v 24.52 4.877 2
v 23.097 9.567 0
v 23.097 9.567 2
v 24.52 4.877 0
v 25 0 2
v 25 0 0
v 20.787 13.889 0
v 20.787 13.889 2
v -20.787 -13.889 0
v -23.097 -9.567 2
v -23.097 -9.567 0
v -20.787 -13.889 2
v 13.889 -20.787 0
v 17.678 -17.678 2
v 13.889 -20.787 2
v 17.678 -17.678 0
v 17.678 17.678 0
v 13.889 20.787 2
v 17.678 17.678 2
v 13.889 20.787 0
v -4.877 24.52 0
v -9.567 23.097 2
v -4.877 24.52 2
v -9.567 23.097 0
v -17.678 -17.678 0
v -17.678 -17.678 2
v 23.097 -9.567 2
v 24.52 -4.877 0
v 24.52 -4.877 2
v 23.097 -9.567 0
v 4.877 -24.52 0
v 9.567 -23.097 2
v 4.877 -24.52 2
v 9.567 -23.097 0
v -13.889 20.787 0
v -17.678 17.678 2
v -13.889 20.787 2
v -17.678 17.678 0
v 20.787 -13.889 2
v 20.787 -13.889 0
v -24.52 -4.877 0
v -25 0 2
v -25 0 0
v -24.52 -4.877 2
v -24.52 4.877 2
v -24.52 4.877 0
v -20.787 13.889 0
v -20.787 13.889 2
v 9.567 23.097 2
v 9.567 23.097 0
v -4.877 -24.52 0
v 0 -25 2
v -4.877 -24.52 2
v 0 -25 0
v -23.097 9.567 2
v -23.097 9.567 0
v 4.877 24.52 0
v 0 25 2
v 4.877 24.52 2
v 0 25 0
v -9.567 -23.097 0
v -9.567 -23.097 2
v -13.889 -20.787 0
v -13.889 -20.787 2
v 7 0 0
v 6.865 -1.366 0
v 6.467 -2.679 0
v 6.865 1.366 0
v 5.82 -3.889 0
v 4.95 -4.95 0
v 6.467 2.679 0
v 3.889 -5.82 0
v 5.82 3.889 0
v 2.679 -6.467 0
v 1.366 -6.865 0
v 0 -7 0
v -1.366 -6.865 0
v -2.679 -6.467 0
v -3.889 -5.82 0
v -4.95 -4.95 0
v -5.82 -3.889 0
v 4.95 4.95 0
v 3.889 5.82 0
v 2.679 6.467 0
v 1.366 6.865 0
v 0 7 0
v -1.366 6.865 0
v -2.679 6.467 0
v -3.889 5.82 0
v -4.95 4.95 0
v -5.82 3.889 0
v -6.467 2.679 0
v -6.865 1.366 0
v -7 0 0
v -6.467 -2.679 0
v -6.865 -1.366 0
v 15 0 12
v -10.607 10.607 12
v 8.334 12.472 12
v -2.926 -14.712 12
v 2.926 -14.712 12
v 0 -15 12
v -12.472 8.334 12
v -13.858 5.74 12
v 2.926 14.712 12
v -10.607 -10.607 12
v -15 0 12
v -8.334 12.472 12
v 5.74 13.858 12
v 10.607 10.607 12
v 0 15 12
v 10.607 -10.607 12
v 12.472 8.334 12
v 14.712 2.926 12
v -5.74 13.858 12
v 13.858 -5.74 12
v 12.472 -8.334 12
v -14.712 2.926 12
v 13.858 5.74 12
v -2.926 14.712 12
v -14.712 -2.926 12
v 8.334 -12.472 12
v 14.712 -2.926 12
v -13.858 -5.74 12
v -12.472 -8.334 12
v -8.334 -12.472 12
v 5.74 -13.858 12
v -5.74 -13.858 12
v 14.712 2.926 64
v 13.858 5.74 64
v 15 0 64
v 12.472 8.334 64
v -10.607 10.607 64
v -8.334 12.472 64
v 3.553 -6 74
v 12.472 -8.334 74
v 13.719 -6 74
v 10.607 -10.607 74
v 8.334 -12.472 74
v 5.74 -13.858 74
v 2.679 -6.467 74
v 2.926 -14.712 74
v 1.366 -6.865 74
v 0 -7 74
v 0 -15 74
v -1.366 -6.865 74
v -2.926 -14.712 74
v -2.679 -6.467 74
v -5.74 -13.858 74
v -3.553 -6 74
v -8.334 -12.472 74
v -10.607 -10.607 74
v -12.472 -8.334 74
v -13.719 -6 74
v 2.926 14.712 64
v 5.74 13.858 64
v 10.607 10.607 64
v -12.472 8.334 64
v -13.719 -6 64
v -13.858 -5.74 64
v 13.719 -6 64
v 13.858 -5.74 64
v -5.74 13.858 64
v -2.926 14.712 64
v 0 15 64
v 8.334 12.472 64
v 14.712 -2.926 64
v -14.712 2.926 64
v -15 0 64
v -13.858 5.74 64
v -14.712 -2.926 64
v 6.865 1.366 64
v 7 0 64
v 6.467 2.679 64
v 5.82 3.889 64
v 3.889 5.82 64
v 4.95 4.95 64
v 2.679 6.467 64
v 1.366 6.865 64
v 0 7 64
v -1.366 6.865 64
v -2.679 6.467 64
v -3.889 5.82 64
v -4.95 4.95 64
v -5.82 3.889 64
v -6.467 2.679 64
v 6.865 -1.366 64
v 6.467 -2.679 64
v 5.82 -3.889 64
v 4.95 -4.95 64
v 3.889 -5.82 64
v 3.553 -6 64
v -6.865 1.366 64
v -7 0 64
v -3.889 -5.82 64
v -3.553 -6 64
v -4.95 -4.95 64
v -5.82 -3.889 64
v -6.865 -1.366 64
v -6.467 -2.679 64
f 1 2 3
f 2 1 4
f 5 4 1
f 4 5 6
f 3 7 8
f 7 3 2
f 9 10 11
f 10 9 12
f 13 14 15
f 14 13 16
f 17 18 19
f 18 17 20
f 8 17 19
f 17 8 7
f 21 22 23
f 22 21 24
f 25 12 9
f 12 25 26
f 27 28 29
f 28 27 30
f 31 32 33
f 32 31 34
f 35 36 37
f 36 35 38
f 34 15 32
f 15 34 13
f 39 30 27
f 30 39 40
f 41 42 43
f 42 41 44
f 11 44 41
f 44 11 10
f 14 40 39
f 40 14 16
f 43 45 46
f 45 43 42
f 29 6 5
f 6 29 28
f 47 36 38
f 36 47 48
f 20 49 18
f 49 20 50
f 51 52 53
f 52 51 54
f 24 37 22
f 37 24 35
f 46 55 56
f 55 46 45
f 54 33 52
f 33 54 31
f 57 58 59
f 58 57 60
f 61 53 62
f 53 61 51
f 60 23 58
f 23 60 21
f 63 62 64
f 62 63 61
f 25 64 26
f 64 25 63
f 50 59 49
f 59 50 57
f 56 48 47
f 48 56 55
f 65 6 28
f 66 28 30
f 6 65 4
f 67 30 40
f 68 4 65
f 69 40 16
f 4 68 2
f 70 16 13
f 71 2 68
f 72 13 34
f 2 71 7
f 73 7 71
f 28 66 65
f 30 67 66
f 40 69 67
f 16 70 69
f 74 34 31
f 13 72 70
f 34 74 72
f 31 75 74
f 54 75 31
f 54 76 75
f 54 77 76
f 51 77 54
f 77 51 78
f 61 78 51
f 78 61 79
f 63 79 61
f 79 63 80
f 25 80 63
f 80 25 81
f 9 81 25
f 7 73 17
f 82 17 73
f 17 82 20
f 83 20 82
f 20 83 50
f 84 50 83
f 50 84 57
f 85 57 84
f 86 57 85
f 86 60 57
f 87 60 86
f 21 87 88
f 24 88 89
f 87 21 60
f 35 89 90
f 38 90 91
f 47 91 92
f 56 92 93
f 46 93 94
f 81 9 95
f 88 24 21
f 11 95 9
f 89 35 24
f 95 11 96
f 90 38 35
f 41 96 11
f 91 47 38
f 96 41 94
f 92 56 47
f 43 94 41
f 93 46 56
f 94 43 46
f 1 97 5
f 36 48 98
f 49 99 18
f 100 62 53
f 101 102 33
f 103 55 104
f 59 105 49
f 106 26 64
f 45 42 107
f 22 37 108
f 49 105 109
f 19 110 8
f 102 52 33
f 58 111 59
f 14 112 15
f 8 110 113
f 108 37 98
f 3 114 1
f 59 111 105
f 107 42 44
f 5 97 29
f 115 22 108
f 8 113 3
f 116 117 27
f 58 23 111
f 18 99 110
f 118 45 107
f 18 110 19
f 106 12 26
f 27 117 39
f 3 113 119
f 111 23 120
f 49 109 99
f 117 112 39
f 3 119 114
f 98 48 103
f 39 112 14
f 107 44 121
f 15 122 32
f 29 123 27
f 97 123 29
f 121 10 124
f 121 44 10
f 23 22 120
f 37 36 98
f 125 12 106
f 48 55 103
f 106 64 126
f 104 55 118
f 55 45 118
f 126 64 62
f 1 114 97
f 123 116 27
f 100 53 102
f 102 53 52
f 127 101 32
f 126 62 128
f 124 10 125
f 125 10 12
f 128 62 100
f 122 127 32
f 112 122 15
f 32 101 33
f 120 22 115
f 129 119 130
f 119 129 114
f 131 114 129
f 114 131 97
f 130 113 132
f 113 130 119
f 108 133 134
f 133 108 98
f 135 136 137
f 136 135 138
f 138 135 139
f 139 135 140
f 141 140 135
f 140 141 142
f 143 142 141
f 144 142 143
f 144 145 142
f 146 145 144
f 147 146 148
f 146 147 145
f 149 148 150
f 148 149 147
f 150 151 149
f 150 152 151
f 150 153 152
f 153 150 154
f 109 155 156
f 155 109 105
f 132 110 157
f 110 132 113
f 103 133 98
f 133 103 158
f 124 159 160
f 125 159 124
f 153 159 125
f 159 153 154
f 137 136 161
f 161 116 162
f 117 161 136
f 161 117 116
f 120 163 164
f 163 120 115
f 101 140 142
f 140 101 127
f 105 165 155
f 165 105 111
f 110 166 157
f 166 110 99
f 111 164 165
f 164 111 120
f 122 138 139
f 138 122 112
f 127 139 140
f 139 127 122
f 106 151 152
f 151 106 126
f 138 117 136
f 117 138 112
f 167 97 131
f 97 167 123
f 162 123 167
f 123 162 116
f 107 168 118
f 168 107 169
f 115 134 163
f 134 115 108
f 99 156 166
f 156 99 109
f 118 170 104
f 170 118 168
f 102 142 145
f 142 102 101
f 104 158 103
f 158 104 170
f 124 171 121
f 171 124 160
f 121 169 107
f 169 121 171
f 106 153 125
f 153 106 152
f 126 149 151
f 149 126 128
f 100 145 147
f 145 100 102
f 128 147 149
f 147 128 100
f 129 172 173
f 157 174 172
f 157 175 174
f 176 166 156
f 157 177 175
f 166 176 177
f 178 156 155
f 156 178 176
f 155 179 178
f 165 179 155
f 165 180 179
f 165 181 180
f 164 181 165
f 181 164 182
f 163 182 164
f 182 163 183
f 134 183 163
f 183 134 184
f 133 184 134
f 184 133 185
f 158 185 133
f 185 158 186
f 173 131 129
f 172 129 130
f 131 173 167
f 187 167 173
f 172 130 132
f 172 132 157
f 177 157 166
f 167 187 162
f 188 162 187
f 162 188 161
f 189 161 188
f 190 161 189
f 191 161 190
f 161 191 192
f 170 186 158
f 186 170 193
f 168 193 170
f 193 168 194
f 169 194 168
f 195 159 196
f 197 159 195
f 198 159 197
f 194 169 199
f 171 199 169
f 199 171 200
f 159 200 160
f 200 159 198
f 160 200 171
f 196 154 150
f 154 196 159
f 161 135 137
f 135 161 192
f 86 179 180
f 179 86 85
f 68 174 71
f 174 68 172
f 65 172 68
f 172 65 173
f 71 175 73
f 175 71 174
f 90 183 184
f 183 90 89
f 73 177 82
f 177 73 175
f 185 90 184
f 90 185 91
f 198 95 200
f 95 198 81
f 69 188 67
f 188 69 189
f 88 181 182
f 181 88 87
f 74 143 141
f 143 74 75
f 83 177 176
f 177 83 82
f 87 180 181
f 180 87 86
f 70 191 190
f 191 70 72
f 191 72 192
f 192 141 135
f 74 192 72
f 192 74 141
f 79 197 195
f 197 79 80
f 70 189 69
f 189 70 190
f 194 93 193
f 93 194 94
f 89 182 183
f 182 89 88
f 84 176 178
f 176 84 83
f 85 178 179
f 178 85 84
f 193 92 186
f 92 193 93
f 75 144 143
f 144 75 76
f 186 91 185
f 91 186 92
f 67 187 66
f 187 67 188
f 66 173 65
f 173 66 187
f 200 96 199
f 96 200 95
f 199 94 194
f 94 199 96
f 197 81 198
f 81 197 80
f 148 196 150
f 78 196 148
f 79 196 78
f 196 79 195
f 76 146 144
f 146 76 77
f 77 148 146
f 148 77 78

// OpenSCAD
// Author    Martin Dubois
// Copyright (C) 2025 Martin Dubois
// Product   Models3D
// File      Computer/MonitorLeg.scad

difference()
{
    union()
    {
        cylinder( 2, SIZE_R2, SIZE_R2, $fn = 32 );

        translate( [ 0, 0, 2 ] )
            cylinder( 10, SIZE_R2, SIZE_R1, $fn = 32 );

        translate( [ 0, 0, 12 ] )
            cylinder( HIGHT - 2 - 10 + 10, SIZE_R1, SIZE_R1, $fn = 32 );
    }

    translate( [ - 15 - EPS, - 6, HIGHT ] )
        cube( [ 2 * EPS + SIZE_D1, SIZE_D1 - 6 + EPS, 10 + EPS ] );

    translate( [ 0, 0, - EPS ] )
        cylinder( 2 * EPS + SIZE_Z, SIZE_R0, SIZE_R0, $fn = 32 );
}

EPS = 0.1;

HIGHT = 64;

SIZE_R0 =  7;
SIZE_R1 = 15;
SIZE_R2 = 25;


SIZE_D1 = 2 * SIZE_R1;
SIZE_Z  = HIGHT + 10;
